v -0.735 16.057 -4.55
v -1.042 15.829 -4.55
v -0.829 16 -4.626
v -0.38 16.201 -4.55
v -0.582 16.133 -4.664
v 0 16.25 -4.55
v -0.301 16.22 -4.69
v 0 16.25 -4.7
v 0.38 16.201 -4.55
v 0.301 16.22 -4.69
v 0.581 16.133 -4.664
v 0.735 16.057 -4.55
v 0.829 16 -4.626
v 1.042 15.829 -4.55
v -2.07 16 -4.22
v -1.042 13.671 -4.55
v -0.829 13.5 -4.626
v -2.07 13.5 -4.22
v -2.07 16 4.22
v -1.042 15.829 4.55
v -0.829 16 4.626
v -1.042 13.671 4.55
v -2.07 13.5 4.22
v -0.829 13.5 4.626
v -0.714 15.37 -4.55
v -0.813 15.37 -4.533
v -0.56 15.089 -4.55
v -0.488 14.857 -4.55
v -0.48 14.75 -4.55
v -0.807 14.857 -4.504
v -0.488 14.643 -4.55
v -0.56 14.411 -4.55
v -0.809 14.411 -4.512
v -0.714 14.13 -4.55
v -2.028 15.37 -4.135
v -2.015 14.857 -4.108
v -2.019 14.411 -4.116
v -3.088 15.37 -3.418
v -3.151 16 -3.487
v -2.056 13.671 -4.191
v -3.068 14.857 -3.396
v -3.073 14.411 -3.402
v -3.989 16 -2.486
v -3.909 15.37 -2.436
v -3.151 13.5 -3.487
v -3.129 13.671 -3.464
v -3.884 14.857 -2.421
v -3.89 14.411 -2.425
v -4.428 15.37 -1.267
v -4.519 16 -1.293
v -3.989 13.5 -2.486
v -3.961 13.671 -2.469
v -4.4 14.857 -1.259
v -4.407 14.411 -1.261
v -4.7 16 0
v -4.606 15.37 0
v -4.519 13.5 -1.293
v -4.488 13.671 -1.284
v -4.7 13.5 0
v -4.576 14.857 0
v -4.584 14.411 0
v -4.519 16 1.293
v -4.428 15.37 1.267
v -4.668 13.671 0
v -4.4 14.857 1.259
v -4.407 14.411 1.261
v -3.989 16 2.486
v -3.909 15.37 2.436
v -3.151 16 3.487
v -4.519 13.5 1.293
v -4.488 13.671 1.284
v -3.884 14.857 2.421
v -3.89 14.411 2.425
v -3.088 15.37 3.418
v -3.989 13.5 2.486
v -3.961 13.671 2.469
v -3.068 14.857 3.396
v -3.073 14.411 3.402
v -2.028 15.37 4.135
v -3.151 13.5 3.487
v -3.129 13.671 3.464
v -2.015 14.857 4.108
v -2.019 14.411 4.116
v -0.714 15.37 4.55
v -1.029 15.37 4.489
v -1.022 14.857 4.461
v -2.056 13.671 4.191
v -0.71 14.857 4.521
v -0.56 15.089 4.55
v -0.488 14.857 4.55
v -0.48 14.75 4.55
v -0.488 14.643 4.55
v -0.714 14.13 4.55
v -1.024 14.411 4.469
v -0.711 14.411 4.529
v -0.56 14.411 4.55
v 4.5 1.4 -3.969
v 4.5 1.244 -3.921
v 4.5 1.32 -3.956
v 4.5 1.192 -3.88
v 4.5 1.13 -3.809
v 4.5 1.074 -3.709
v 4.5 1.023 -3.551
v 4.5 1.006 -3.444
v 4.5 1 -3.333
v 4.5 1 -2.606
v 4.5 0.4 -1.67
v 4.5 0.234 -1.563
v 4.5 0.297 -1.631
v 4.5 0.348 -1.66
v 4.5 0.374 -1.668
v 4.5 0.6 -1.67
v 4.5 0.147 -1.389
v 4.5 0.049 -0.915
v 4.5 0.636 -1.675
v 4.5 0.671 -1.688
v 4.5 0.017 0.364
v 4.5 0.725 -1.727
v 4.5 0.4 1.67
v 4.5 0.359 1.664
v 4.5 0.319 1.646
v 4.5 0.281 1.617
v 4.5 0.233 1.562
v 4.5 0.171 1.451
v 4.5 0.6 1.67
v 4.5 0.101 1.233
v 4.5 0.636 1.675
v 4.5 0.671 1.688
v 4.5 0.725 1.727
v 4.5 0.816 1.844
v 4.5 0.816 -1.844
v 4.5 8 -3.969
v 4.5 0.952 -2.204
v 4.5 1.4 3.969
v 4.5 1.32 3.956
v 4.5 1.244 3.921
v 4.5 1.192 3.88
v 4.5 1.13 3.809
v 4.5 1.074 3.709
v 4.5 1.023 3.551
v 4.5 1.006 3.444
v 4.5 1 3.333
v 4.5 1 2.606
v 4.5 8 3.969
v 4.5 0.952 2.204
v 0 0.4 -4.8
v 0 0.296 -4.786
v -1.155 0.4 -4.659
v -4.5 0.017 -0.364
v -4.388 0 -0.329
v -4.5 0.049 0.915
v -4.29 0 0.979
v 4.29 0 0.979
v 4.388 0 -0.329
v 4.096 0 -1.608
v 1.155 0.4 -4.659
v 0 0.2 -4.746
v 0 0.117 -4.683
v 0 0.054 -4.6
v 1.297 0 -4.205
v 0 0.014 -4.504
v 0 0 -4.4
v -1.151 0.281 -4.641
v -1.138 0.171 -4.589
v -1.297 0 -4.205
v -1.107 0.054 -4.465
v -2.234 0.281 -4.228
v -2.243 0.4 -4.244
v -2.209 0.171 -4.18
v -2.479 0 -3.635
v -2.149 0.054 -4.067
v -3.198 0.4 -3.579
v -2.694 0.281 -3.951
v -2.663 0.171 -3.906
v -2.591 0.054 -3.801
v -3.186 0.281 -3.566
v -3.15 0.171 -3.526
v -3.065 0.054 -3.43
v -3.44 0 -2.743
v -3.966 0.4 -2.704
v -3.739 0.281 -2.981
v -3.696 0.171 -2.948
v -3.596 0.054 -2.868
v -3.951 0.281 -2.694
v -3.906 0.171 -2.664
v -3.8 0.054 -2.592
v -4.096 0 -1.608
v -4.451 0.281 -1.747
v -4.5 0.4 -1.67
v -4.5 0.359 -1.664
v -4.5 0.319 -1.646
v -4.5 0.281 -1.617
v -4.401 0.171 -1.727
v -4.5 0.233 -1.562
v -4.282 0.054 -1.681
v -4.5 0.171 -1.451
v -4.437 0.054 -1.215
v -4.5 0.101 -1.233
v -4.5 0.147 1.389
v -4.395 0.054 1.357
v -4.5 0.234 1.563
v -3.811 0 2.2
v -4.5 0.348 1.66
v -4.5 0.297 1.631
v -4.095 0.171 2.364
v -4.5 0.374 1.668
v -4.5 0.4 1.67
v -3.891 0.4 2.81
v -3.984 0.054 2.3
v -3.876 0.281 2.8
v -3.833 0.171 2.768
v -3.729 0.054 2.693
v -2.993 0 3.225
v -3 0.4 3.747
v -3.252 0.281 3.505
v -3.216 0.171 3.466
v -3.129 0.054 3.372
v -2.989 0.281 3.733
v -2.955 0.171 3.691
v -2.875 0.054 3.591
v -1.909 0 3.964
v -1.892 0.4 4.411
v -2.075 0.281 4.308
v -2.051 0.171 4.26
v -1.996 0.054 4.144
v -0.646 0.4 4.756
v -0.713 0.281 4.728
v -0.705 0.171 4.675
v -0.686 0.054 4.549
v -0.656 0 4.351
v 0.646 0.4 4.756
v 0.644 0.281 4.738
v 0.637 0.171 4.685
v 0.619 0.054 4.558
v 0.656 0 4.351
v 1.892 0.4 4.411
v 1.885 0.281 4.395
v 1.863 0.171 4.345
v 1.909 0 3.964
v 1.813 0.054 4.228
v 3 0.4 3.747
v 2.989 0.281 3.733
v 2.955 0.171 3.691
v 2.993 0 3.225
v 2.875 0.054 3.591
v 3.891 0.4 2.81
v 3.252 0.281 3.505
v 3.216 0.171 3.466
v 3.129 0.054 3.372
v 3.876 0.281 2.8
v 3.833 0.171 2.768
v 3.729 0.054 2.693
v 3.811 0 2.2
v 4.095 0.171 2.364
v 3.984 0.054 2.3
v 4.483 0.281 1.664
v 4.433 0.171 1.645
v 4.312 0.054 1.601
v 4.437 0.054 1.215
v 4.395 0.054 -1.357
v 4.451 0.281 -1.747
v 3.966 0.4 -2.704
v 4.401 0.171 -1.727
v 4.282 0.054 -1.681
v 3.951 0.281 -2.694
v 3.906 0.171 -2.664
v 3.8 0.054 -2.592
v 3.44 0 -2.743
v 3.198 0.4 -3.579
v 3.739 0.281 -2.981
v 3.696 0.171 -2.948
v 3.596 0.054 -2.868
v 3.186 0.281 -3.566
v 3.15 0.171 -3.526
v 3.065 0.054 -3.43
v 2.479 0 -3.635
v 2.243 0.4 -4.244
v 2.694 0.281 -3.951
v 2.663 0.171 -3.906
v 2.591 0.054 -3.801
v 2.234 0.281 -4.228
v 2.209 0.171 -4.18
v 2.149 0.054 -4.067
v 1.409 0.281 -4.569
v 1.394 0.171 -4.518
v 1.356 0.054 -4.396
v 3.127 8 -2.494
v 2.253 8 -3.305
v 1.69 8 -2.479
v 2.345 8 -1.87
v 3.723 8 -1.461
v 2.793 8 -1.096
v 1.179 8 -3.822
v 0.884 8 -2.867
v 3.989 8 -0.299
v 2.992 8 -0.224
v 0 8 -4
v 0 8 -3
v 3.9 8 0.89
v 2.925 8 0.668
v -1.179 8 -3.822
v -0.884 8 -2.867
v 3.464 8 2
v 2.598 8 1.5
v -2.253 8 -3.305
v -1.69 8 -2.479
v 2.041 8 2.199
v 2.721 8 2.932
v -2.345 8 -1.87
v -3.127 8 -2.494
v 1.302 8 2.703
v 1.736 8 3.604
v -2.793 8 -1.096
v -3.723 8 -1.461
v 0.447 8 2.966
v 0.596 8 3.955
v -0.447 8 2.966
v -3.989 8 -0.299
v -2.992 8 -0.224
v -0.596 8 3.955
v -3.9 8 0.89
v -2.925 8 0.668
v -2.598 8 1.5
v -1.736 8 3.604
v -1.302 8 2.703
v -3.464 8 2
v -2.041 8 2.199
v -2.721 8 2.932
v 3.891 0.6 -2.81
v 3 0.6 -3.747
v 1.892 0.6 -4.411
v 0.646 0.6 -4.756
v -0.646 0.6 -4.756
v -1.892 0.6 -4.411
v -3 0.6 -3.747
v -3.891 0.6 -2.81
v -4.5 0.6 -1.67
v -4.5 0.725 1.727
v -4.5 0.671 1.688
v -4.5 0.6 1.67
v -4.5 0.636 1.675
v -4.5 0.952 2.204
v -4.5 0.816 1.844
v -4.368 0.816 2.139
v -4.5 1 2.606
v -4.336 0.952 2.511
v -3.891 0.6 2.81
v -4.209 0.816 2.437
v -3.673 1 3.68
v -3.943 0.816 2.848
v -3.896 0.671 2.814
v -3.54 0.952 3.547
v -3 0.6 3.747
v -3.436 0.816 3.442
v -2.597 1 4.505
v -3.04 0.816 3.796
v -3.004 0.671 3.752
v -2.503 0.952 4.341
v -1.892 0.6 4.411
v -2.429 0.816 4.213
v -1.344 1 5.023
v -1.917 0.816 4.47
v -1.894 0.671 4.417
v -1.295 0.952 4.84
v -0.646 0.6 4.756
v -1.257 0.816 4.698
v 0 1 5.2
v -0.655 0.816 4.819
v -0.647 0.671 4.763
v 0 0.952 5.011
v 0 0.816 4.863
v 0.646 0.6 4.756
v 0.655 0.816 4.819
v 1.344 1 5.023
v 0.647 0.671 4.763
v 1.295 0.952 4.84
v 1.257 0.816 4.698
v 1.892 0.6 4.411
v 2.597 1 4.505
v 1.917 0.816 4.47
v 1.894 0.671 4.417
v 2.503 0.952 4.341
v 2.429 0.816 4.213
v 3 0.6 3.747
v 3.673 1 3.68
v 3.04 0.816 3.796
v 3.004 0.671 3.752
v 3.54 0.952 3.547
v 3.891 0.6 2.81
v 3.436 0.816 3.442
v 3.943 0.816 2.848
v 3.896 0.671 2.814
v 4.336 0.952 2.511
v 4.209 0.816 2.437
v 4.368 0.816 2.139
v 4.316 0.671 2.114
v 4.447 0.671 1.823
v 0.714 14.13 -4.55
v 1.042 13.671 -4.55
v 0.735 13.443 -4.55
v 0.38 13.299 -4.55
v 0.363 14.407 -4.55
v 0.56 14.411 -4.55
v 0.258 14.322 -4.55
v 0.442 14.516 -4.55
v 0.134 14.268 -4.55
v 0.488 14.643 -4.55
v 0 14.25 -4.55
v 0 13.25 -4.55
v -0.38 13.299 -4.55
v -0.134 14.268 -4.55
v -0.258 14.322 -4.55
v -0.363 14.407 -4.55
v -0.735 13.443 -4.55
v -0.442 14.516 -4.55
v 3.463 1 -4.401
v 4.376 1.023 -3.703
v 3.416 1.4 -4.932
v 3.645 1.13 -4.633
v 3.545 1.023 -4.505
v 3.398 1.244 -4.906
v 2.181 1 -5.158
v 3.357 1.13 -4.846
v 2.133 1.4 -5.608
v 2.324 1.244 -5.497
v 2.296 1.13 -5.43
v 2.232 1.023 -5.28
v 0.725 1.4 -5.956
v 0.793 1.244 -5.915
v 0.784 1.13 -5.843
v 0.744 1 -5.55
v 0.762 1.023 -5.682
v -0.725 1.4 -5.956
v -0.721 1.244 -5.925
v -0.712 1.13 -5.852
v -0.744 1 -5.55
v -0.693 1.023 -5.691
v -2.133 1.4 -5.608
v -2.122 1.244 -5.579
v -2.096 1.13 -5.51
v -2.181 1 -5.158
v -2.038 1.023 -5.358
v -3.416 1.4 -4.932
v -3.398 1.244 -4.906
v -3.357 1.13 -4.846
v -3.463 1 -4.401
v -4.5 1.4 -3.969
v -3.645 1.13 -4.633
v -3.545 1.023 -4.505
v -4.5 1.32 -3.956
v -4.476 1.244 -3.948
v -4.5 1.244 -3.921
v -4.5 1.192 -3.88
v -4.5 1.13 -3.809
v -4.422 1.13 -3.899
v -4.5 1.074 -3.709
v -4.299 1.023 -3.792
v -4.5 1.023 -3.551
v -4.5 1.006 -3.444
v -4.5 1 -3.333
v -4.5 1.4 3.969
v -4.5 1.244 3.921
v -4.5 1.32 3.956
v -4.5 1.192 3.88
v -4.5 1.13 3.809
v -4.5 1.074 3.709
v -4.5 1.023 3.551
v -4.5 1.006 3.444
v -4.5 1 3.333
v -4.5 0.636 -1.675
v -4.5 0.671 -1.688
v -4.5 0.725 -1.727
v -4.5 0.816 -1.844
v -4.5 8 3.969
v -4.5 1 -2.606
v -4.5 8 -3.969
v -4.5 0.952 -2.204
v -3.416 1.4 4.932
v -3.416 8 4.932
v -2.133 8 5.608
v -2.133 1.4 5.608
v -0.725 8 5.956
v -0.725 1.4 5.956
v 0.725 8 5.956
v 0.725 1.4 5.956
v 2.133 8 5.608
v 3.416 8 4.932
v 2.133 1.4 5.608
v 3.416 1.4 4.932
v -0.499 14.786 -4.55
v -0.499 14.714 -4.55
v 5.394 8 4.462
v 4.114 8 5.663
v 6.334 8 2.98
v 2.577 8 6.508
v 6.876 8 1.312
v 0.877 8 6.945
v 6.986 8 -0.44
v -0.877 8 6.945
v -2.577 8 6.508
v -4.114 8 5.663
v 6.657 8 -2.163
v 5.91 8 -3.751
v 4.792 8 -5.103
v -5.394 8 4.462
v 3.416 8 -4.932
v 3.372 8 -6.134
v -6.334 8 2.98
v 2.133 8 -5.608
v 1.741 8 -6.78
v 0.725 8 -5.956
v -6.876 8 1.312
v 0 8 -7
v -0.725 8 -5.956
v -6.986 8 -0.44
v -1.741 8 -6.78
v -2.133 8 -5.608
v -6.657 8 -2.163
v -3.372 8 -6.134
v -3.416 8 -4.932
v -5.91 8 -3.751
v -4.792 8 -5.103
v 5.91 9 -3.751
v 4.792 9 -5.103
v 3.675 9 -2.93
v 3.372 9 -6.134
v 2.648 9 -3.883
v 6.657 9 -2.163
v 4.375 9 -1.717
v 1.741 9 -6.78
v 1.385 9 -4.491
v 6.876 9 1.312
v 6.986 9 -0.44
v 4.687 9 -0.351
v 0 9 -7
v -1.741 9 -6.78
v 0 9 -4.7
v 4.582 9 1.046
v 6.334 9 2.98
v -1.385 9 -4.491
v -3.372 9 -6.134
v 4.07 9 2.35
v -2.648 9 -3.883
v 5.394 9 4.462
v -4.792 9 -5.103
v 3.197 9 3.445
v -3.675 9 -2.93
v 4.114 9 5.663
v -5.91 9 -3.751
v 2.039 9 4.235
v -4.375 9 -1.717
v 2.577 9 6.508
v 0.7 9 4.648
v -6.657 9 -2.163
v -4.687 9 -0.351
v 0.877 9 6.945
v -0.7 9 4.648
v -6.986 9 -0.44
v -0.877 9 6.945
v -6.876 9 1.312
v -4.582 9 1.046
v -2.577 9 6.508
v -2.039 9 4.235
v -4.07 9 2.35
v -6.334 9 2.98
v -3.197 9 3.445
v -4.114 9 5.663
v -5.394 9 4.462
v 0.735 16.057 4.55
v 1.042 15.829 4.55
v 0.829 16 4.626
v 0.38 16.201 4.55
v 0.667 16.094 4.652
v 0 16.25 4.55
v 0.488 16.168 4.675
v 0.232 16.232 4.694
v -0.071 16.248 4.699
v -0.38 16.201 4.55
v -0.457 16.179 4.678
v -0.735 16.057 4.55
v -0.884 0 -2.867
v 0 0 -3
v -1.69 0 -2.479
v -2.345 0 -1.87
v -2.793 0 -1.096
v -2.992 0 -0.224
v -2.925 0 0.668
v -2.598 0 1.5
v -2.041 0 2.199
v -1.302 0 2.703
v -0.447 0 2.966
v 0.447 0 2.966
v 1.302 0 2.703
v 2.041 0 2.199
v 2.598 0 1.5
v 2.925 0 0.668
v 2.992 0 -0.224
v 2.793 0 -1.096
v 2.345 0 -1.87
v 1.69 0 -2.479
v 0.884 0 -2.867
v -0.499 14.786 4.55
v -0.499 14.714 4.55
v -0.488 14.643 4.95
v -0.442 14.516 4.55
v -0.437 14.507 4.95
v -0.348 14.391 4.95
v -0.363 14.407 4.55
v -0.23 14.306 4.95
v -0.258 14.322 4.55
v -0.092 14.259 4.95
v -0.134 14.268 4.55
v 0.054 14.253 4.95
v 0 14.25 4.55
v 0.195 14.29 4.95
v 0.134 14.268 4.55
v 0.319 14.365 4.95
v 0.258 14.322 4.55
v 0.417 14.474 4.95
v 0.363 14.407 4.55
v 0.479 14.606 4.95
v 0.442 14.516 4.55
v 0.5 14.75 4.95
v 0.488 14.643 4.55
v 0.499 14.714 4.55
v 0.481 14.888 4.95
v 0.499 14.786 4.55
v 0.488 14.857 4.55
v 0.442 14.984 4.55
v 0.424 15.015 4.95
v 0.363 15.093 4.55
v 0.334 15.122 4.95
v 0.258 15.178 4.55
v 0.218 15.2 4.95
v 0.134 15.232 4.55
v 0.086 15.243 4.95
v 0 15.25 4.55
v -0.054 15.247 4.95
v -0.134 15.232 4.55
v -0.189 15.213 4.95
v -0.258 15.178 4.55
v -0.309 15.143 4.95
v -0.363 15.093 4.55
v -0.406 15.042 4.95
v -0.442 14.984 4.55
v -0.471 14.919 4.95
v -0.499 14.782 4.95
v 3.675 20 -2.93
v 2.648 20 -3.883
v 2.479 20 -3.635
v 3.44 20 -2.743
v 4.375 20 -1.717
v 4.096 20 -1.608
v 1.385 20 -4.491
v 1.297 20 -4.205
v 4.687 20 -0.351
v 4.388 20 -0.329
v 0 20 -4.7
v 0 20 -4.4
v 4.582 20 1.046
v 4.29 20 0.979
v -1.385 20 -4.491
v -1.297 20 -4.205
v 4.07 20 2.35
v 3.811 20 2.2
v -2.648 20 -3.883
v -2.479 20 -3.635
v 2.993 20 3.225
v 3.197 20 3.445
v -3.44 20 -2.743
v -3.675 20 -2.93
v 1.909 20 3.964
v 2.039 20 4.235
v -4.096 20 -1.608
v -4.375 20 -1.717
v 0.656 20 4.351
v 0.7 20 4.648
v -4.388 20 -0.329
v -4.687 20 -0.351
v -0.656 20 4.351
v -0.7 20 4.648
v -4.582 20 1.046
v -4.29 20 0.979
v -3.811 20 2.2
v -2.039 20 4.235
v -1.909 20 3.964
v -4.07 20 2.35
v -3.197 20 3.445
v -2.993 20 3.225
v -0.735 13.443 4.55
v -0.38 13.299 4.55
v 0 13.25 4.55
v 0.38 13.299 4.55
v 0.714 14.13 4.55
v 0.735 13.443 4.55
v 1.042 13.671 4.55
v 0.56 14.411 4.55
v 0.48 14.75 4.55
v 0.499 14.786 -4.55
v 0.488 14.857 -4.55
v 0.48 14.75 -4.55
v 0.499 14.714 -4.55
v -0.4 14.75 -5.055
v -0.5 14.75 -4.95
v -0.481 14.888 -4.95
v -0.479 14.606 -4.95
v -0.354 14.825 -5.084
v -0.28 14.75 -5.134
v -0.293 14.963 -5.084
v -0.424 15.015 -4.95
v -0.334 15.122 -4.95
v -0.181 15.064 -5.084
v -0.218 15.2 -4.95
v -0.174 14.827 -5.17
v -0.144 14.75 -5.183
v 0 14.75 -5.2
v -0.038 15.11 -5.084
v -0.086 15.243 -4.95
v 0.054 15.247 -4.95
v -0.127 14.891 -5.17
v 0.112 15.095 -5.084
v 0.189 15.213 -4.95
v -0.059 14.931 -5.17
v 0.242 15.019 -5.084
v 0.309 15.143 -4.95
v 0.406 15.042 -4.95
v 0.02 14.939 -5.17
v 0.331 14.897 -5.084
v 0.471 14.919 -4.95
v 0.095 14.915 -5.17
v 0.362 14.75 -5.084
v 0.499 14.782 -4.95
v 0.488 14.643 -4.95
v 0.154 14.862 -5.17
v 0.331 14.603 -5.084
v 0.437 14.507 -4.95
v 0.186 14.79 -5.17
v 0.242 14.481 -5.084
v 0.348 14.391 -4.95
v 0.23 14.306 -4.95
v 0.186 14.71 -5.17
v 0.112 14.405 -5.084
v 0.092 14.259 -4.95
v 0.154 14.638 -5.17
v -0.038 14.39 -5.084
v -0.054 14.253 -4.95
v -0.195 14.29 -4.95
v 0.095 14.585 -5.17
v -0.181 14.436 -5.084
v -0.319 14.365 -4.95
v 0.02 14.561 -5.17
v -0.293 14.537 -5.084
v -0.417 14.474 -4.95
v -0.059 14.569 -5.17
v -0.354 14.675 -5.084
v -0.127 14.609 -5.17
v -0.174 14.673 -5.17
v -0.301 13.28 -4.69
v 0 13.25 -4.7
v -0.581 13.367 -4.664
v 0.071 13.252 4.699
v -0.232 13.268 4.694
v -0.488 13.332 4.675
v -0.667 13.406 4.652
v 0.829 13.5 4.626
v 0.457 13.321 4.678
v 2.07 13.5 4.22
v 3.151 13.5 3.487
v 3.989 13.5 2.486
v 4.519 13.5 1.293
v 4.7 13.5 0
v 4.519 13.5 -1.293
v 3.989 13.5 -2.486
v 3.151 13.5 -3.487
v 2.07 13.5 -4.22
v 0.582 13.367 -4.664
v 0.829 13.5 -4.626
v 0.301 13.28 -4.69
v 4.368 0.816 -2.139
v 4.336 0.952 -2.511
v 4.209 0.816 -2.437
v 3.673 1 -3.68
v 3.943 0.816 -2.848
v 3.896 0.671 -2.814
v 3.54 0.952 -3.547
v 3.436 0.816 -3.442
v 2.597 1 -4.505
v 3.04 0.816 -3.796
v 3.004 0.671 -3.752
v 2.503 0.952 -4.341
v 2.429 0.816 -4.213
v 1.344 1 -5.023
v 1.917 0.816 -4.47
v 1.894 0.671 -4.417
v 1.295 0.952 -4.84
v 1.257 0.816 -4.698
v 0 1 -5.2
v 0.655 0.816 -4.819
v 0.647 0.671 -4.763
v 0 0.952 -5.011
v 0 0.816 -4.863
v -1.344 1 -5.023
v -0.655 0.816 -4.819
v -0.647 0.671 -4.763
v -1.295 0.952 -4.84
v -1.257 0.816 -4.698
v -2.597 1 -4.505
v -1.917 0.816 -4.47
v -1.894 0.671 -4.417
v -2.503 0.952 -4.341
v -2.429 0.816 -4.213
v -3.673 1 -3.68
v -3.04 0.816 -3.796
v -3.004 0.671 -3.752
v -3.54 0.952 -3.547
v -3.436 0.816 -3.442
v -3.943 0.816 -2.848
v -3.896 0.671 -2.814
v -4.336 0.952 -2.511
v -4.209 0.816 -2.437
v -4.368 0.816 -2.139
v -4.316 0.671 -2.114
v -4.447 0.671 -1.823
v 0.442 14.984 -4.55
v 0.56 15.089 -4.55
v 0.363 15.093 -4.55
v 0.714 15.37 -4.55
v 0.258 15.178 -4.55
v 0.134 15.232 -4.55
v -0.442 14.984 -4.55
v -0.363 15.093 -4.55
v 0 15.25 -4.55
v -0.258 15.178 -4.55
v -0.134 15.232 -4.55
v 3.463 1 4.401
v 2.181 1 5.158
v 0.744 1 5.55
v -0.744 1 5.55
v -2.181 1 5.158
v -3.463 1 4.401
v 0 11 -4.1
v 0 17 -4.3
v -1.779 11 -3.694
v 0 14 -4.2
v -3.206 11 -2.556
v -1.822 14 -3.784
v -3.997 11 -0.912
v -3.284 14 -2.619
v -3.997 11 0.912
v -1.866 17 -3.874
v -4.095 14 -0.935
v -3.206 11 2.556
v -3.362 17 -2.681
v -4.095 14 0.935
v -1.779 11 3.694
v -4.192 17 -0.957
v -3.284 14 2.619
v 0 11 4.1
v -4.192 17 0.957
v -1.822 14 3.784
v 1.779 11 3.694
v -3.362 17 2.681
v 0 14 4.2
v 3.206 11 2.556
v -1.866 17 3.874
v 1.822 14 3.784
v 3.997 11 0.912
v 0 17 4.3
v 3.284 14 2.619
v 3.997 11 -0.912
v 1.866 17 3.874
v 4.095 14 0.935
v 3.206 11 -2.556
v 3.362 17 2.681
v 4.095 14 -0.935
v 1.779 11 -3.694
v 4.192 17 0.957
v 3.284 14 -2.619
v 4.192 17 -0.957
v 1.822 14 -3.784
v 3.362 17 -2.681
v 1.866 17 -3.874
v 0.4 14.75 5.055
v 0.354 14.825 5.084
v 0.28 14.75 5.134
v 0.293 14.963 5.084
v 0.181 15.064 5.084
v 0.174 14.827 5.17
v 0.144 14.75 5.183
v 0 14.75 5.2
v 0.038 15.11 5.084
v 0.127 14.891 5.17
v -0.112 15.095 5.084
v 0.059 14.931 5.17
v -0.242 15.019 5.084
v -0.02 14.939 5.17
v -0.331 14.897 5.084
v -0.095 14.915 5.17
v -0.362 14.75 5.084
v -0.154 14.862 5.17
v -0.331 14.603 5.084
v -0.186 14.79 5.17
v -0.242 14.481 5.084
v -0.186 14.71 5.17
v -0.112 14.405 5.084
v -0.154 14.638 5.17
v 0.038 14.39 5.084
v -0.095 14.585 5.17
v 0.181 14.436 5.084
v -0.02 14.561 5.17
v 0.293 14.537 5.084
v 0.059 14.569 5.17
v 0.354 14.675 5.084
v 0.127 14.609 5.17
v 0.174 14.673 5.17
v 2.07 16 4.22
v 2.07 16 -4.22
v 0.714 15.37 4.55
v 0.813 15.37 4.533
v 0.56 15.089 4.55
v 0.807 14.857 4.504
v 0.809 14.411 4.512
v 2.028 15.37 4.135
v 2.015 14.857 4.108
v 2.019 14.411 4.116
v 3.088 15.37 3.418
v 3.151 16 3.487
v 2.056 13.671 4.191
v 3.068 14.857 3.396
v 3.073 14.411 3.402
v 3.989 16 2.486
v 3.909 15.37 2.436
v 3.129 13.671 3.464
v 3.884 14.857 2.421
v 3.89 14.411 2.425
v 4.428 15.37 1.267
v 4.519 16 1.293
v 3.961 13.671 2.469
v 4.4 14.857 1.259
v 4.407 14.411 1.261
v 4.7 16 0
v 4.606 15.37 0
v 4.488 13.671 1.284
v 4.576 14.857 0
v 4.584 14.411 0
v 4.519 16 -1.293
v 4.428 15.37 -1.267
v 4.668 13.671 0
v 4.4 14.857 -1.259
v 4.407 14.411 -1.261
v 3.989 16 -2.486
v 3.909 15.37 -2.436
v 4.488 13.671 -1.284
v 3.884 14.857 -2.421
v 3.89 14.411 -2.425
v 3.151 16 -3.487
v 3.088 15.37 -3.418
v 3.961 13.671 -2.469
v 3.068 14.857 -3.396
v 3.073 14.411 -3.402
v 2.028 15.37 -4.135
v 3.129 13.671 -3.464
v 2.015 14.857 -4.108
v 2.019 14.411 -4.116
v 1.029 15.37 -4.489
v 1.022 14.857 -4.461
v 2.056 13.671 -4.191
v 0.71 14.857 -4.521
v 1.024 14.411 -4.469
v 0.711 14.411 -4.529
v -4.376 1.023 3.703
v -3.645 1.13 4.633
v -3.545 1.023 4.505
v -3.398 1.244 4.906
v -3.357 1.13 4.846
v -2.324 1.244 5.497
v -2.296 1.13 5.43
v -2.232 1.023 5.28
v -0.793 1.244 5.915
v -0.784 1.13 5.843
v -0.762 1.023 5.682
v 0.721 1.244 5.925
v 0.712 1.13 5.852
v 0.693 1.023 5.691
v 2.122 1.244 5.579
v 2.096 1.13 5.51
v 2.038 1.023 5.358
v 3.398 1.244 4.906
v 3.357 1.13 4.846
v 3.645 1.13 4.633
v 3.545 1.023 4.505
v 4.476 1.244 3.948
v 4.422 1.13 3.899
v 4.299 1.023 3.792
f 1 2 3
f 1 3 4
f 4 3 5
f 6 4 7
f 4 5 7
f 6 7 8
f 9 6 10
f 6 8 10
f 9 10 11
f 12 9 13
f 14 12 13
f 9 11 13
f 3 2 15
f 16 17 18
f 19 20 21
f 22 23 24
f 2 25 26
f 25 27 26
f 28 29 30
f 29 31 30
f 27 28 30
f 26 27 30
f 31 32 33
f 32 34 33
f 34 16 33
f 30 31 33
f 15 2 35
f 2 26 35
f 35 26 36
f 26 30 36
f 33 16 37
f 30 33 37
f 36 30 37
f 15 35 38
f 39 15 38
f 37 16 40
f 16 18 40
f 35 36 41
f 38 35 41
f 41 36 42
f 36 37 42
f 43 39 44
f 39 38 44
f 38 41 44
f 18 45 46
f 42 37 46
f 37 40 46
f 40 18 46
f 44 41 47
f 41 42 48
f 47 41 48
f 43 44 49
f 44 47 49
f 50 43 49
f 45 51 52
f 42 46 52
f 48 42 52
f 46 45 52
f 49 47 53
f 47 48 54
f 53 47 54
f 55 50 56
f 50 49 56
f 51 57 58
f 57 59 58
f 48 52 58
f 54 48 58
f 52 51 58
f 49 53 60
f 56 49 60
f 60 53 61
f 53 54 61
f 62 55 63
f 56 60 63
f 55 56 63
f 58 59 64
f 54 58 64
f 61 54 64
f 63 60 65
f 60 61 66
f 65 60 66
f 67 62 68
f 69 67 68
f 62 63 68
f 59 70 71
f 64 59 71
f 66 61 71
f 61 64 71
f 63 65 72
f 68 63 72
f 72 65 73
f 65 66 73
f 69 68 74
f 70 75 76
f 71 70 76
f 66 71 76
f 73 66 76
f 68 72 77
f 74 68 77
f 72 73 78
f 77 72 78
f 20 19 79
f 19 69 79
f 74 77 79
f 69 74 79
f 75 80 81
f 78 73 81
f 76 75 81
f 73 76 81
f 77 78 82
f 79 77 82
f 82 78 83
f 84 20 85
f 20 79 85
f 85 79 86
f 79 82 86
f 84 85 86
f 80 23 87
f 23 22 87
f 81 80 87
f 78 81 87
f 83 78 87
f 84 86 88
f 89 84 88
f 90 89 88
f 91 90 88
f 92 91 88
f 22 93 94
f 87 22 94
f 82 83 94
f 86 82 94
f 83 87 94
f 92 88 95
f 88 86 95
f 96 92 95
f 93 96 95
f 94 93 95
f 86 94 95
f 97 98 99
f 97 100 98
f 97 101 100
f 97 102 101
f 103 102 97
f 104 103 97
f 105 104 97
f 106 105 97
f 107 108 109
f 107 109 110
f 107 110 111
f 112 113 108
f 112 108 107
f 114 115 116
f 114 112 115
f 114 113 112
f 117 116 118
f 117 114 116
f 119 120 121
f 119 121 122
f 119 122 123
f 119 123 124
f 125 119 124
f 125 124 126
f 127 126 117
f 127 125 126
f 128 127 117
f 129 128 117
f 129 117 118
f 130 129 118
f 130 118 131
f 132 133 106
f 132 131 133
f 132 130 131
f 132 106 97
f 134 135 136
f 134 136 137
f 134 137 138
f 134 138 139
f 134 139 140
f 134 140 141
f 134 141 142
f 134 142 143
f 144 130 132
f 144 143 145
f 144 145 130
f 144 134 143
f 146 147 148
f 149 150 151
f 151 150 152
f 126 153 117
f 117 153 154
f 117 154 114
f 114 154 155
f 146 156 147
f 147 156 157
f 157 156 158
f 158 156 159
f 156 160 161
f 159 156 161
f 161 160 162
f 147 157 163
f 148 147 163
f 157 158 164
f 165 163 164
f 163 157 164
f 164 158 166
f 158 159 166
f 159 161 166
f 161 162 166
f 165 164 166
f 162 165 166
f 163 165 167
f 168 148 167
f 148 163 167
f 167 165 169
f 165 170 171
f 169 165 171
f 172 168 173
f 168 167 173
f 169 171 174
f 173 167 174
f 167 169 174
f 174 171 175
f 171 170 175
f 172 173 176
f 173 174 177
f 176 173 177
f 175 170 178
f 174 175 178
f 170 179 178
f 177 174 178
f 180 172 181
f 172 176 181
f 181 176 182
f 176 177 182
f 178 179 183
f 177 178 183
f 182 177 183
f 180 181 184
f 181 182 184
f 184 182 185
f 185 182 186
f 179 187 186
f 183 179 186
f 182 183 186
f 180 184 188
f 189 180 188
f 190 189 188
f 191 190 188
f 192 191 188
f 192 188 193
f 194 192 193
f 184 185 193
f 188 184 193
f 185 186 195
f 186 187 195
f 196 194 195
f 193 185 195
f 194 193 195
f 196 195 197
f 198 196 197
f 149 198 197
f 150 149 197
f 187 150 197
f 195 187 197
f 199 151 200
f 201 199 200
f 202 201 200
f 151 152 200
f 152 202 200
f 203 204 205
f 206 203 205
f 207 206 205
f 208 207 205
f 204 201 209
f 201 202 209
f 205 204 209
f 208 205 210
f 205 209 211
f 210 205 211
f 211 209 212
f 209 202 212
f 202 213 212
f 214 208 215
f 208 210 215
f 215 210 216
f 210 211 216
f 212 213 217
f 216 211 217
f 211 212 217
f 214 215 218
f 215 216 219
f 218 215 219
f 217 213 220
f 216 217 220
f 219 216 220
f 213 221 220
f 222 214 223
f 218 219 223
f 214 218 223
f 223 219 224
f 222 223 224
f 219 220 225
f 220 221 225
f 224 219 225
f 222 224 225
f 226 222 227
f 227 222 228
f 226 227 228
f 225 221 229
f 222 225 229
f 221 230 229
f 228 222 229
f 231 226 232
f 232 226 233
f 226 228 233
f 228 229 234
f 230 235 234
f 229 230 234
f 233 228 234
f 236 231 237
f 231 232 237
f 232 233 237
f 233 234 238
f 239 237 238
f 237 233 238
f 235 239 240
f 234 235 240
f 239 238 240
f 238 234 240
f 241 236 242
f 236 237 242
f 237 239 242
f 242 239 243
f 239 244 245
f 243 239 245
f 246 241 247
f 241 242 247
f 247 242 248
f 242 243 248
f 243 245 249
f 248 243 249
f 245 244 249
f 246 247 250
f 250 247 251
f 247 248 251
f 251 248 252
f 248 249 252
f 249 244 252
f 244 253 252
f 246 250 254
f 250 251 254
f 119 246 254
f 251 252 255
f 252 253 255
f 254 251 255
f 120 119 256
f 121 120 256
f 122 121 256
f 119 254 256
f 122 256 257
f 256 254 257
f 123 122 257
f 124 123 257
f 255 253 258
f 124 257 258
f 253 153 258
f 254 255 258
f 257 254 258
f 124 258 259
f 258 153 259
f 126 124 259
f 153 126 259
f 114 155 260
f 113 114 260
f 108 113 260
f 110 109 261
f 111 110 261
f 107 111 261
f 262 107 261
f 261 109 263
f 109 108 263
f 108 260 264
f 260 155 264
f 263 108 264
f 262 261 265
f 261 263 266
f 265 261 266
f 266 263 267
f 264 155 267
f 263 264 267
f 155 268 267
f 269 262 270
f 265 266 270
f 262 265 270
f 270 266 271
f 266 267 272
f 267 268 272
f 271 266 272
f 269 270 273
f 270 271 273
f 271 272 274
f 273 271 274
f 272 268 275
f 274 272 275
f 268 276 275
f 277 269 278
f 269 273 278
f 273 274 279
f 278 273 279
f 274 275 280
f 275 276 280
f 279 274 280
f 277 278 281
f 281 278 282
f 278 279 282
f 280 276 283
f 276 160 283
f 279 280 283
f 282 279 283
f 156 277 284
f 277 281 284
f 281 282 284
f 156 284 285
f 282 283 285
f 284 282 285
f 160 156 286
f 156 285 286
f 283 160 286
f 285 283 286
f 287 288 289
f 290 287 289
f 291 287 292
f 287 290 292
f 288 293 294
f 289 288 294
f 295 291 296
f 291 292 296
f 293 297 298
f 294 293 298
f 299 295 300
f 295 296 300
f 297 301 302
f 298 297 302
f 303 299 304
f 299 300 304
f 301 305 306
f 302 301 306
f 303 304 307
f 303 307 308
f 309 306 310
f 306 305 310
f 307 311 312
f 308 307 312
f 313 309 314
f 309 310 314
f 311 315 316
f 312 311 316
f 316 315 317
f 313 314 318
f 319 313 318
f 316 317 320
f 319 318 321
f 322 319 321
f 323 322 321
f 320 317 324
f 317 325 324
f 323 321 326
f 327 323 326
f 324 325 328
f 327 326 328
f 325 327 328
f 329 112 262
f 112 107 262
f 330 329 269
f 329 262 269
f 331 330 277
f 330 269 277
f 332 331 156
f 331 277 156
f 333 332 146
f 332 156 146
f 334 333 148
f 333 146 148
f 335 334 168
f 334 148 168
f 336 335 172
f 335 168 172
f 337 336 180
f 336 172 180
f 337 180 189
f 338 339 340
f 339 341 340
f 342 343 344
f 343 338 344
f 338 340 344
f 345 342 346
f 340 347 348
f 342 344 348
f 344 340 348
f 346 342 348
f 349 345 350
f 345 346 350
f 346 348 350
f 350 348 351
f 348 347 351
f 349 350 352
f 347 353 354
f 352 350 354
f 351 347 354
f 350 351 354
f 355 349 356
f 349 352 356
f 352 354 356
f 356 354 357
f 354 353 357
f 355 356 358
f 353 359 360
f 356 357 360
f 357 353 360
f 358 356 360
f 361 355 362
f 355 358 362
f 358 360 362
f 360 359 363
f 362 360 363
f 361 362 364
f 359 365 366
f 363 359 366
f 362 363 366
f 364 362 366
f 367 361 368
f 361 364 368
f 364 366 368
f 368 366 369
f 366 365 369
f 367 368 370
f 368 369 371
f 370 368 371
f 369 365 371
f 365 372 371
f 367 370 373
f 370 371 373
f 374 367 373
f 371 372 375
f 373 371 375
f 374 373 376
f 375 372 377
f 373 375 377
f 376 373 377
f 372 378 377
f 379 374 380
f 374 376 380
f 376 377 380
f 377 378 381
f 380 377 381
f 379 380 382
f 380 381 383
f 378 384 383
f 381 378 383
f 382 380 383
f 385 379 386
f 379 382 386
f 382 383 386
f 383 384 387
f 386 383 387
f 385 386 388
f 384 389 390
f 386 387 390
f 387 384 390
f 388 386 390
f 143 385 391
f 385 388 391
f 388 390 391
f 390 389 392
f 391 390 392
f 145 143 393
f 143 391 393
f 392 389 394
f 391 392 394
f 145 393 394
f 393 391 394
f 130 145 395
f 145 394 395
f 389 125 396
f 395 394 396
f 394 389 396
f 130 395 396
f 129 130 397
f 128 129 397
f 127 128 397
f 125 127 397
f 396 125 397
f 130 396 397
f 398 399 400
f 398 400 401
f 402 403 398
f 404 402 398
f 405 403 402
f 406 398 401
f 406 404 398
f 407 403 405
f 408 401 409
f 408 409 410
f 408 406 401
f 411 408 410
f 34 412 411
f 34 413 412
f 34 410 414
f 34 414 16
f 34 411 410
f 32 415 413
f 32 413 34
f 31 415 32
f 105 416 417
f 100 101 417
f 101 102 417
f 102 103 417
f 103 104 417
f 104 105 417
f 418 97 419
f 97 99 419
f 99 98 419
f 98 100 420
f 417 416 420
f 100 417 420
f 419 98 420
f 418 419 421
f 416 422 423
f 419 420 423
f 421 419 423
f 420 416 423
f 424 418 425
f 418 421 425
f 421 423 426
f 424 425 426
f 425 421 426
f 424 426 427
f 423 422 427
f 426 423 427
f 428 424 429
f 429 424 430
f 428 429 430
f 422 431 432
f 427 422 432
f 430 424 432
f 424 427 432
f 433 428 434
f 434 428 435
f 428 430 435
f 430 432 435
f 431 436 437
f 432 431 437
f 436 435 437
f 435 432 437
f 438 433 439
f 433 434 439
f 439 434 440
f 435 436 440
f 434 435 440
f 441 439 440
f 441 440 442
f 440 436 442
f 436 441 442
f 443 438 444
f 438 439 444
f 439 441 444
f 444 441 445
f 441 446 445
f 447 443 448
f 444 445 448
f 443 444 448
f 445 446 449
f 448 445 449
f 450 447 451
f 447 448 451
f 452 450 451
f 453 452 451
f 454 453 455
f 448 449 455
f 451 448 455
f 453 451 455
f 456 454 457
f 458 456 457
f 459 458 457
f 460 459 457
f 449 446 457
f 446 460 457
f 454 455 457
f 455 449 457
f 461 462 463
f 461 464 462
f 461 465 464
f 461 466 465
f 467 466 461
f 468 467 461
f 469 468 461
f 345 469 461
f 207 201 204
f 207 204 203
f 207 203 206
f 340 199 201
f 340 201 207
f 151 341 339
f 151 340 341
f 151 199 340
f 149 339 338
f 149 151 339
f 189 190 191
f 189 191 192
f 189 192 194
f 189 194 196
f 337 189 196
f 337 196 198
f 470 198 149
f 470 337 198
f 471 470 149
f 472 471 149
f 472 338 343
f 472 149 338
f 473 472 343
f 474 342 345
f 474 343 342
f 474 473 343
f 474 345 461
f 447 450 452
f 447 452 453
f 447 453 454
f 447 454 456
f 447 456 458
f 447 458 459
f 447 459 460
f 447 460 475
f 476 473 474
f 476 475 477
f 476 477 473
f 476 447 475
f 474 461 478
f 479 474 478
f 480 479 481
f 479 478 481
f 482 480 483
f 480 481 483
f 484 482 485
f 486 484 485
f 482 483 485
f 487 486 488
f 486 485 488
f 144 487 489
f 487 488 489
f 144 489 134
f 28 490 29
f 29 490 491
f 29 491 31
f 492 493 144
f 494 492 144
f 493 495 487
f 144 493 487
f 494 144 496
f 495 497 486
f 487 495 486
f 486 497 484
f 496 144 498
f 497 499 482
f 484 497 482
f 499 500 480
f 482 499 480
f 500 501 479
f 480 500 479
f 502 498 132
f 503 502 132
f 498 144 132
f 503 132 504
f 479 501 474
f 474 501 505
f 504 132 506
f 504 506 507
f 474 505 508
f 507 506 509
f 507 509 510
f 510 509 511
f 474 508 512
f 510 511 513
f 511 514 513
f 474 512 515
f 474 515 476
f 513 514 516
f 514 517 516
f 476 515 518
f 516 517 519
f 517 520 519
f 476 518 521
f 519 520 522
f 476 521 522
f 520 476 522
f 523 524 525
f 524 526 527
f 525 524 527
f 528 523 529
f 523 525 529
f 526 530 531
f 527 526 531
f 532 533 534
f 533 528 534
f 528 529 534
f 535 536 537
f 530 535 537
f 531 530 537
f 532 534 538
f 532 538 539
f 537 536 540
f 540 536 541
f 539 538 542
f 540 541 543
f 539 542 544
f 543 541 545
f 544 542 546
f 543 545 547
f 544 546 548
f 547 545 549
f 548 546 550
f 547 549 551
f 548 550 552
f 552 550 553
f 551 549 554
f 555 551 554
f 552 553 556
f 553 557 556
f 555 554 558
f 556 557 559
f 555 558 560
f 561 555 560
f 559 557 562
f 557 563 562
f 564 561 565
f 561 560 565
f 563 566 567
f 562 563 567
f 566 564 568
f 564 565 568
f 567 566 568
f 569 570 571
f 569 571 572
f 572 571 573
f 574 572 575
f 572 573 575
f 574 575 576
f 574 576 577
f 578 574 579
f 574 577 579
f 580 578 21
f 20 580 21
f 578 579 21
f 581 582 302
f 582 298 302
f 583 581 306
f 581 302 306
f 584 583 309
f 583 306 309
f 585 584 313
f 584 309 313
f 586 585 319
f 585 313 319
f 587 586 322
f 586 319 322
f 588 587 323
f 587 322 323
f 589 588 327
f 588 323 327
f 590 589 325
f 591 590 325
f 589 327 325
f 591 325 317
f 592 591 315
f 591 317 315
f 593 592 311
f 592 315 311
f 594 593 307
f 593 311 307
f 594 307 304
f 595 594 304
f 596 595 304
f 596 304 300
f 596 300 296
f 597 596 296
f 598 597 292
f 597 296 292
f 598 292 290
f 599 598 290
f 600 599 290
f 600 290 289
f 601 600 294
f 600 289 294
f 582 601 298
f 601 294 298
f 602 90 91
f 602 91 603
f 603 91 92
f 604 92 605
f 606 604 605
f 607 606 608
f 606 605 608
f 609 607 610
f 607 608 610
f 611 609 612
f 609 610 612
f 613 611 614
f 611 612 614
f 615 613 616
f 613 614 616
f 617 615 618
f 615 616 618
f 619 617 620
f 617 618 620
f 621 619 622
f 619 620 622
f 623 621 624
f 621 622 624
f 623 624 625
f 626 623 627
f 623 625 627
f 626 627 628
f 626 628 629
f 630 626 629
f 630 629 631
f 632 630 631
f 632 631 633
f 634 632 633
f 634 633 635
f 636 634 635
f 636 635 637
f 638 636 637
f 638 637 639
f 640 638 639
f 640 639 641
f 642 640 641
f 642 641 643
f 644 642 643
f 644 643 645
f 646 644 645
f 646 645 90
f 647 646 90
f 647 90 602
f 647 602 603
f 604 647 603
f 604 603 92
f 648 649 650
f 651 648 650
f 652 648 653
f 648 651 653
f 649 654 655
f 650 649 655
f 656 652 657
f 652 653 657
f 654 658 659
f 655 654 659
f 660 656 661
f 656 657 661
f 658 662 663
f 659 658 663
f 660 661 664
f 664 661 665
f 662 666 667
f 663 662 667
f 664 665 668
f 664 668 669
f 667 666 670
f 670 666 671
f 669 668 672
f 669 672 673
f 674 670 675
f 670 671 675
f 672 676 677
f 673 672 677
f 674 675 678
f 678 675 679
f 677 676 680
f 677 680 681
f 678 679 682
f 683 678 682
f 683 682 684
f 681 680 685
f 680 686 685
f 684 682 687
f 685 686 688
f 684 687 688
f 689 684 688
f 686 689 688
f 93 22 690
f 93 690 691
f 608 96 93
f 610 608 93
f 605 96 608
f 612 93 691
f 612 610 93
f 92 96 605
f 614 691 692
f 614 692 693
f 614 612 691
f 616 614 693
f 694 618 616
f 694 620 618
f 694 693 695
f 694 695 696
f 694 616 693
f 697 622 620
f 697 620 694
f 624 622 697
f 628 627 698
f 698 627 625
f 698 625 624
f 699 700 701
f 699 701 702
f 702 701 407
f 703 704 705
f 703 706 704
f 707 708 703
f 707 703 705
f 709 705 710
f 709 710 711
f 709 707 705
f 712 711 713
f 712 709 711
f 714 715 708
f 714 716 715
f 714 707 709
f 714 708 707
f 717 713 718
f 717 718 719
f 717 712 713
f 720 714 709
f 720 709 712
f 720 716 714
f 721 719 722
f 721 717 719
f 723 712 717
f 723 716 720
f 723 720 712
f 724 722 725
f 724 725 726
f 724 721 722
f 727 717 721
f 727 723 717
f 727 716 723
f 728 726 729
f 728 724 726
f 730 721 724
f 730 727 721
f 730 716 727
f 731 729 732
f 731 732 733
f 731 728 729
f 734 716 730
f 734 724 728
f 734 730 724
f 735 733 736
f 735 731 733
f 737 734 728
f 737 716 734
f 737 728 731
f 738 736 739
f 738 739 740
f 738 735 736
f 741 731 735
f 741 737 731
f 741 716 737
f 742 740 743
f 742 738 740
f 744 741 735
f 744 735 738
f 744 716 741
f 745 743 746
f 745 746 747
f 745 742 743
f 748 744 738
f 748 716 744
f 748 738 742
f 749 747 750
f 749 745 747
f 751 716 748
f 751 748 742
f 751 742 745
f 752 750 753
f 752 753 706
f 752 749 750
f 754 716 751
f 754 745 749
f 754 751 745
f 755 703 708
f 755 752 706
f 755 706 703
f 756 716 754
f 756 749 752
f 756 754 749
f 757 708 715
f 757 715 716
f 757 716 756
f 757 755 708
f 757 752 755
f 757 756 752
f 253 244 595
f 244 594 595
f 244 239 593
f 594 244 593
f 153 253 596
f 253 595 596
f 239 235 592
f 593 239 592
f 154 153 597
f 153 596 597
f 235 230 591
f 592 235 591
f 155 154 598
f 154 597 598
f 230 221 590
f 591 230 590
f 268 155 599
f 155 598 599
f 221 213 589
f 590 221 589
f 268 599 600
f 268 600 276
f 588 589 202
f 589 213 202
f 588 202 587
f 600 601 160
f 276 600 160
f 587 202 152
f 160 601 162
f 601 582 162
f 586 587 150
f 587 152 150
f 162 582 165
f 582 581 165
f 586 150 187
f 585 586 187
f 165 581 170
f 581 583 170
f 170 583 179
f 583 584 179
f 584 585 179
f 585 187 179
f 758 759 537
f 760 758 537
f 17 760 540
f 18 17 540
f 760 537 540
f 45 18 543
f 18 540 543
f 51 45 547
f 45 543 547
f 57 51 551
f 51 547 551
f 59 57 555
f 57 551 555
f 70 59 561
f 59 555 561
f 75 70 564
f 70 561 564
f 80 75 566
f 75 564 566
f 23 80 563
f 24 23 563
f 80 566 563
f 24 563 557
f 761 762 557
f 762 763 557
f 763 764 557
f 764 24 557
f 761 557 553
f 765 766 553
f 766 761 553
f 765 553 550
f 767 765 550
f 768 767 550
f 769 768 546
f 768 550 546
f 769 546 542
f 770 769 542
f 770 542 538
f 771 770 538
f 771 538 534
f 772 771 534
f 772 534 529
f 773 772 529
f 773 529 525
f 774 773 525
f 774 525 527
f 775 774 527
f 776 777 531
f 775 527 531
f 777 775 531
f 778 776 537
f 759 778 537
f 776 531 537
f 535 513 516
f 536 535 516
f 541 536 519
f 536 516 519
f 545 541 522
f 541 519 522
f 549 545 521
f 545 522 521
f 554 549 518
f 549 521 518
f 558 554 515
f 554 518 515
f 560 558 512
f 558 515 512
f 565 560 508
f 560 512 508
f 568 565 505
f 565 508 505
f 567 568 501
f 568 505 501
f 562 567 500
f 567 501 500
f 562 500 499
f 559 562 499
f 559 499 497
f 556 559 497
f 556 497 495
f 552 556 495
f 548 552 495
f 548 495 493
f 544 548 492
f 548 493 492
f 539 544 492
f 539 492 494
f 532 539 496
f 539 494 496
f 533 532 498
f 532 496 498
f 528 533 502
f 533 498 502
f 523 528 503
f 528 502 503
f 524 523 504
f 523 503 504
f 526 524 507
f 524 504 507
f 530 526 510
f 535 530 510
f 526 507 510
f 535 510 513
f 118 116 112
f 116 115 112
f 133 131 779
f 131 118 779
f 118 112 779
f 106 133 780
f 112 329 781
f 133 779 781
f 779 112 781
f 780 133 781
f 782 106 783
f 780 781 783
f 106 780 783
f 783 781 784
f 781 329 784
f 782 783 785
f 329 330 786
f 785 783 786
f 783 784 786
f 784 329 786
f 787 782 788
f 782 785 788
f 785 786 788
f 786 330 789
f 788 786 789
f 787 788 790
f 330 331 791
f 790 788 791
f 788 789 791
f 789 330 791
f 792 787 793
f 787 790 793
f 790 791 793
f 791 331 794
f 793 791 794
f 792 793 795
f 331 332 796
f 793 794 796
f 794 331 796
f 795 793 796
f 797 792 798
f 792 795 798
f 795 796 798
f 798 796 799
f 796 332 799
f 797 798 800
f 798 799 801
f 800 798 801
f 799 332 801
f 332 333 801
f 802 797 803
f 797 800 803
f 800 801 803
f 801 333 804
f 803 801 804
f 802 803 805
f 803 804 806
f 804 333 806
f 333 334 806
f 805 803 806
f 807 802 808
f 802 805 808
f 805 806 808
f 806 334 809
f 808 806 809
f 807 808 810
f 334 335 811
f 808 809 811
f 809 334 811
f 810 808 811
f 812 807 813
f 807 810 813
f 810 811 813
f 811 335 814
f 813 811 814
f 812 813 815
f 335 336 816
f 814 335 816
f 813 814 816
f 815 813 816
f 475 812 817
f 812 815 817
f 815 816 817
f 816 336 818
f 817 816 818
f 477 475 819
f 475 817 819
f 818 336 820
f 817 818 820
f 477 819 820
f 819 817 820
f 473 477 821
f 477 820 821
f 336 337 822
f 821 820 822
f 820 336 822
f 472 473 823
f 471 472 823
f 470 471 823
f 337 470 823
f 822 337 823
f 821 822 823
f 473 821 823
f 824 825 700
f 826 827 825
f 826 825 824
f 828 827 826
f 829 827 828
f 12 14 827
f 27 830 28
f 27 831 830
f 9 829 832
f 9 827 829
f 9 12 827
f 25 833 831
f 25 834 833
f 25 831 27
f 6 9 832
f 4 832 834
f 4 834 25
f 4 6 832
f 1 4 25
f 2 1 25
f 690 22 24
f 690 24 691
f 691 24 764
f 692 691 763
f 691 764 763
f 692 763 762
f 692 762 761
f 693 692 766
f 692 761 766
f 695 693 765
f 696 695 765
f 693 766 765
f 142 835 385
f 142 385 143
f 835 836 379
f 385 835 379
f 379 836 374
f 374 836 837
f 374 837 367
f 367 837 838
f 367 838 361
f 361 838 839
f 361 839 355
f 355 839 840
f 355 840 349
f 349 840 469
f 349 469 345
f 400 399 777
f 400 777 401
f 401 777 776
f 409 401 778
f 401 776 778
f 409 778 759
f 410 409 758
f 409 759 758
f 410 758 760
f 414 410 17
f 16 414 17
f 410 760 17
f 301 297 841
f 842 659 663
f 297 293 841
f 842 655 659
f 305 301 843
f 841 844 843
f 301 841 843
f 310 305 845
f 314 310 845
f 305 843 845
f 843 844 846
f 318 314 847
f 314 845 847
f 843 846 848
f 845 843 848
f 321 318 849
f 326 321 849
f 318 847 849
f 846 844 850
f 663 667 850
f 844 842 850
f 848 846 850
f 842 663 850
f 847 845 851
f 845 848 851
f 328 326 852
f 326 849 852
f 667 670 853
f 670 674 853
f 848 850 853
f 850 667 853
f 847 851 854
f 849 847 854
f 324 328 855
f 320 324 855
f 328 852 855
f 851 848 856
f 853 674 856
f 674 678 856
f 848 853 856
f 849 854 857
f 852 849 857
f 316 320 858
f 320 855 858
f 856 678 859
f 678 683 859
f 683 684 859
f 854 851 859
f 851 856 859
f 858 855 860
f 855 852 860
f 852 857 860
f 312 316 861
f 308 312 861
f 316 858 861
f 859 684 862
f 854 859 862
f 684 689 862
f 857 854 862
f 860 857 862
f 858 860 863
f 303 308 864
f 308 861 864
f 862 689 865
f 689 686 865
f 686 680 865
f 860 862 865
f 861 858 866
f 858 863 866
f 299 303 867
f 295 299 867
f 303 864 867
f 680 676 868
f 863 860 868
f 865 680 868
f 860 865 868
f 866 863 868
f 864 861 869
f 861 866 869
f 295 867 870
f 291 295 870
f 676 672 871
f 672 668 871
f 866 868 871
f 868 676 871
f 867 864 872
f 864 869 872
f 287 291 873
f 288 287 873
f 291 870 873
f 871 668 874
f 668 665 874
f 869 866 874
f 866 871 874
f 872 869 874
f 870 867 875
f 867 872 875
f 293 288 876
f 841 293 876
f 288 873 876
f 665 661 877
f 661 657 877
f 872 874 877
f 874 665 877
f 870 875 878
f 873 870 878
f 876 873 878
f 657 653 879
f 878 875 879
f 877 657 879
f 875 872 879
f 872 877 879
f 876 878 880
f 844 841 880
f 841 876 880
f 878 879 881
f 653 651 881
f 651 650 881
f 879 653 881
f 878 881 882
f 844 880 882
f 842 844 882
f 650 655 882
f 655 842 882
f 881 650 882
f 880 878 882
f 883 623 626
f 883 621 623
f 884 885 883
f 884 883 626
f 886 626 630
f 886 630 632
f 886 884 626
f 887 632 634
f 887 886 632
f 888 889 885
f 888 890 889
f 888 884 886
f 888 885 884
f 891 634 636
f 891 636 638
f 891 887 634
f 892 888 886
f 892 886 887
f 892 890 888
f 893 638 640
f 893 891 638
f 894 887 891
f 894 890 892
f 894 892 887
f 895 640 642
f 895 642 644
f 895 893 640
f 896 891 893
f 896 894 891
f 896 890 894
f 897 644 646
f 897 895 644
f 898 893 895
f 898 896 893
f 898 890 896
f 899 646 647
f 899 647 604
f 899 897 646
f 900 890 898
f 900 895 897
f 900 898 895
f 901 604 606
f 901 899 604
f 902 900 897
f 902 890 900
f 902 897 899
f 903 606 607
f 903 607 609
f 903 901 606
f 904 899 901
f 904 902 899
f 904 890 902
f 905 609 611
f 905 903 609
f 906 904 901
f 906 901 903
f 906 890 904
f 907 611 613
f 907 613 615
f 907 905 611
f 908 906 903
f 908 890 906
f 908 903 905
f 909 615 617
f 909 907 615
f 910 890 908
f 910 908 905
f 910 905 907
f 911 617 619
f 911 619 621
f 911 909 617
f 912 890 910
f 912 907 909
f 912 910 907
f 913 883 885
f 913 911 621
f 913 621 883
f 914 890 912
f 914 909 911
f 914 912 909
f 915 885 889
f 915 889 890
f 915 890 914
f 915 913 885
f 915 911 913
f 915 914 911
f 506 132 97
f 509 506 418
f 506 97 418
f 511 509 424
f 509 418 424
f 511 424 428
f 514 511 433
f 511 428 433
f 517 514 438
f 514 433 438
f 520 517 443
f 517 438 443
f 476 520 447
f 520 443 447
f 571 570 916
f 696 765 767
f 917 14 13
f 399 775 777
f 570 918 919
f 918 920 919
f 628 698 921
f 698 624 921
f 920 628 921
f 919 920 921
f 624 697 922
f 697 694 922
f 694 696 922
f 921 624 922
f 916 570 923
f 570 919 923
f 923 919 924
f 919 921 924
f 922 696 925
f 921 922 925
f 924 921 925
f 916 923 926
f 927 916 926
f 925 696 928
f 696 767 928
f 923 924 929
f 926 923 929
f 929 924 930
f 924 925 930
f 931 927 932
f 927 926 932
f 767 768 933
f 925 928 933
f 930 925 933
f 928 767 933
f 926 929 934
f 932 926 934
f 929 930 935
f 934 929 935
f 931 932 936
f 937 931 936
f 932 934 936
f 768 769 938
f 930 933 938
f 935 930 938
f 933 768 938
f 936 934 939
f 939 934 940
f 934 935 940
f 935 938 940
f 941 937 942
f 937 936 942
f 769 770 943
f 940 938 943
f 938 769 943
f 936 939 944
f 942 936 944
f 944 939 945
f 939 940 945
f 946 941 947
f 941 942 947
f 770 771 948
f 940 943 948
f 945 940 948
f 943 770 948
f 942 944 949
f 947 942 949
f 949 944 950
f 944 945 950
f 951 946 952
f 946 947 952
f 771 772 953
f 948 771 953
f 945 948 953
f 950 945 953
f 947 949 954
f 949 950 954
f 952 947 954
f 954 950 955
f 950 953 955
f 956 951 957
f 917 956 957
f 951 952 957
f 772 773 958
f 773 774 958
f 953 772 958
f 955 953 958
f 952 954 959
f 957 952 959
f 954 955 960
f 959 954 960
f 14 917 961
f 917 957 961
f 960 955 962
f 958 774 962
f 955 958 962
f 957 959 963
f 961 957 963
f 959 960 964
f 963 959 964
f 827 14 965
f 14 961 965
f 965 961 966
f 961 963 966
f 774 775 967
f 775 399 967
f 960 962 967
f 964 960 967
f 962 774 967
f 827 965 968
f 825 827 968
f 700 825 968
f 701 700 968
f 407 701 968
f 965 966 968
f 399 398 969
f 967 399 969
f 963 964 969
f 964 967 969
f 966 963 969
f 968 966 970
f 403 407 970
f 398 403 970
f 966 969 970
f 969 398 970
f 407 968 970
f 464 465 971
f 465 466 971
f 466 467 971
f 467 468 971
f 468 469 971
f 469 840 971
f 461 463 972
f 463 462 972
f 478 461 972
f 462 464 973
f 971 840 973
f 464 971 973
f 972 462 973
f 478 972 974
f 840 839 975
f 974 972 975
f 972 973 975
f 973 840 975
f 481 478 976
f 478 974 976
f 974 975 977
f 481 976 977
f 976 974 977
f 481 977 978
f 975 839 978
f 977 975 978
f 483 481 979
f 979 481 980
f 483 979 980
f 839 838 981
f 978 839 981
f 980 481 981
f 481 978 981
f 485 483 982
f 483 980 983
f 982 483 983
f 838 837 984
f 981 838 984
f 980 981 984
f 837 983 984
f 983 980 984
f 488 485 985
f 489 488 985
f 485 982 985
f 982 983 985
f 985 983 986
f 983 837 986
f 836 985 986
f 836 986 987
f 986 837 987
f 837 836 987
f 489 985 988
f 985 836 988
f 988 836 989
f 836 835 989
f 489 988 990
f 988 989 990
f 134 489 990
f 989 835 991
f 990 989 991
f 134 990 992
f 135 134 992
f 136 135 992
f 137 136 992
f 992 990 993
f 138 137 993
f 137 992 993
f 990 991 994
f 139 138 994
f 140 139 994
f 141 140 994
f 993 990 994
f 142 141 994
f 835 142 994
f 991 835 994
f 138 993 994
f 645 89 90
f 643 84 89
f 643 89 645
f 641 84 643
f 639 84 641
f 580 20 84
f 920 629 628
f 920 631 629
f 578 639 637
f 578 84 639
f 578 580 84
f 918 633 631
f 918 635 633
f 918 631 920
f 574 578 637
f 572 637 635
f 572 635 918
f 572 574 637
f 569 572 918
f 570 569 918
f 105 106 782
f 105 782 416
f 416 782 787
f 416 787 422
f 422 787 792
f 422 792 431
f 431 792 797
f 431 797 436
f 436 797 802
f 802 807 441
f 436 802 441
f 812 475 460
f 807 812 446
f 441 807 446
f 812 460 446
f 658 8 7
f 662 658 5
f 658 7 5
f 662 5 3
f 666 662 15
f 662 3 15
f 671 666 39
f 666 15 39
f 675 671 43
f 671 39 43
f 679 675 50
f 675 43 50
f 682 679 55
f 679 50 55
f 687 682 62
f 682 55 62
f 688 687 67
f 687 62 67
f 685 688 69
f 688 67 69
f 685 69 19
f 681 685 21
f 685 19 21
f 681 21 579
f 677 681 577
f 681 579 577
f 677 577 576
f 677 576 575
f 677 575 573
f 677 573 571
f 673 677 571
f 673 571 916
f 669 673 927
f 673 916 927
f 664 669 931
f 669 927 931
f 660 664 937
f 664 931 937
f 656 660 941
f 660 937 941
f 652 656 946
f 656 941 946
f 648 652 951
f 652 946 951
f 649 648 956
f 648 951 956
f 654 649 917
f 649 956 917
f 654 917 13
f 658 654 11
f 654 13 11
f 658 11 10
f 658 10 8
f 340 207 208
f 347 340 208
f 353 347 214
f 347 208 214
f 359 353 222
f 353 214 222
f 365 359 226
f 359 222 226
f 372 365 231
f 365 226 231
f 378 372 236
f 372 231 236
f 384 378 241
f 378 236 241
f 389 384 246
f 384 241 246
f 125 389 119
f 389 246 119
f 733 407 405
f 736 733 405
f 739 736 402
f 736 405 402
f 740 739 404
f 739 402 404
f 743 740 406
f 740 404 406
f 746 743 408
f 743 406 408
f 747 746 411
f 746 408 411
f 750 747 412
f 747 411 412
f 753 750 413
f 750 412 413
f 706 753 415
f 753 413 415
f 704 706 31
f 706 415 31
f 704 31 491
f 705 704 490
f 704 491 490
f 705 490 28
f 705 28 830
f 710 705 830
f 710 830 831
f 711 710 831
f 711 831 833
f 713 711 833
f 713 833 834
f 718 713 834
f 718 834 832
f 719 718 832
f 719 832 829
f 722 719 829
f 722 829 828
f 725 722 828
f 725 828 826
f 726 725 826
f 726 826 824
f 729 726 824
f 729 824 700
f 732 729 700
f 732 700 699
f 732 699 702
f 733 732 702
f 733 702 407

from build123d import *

# Parameters (mm, degrees)
SKETCH_2_W                            = 2.5
SKETCH_2_H                            = 8
CUT_EXTRUDE_1_DEPTH                   = 10
SKETCH_5_R                            = 1.5
CUT_EXTRUDE_4_DEPTH                   = 0.15
SKETCH_7_R                            = 0.5
EXTRUDE_1_DEPTH                       = 0.4
DOME_1_FACE_RADIUS                    = 0.5
DOME_1_HEIGHT                         = 0.25
PATTERN_CIRCULAR_1_COUNT              = 2
PATTERN_CIRCULAR_1_COPY_1_FACE_RADIUS = 0.5
PATTERN_CIRCULAR_1_COPY_1_HEIGHT      = 0.25


with BuildPart() as part:
    # Эскиз1 → Повернуть1 (revolve)
    with BuildSketch(Plane(origin=(0, 0, 0), x_dir=(0, 0, -1), z_dir=(1, 0, 0))):
        with BuildLine():
            Line((4.7, 20), (4.7, 16))
            ThreePointArc((4.7, 16), (4.57524704, 14.75), (4.7, 13.5))
            Line((4.7, 13.5), (4.7, 9))
            Line((4.7, 9), (7, 9))
            Line((7, 9), (7, 8))
            Line((7, 8), (6, 8))
            Line((6, 8), (6, 1.4))
            ThreePointArc((6, 1.4), (5.882842712, 1.117157288), (5.6, 1))
            Line((5.6, 1), (5.2, 1))
            ThreePointArc((5.2, 1), (4.917157288, 0.882842712), (4.8, 0.6))
            Line((4.8, 0.6), (4.8, 0.4))
            ThreePointArc((4.8, 0.4), (4.682842712, 0.117157288), (4.4, 0))
            Line((4.4, 0), (3, 0))
            Line((3, 0), (3, 8))
            Line((3, 8), (4, 8))
            Line((4, 8), (4.4, 20))
            Line((4.4, 20), (4.7, 20))
        make_face()
    revolve(axis=Axis((0, 0, 0), (0, 1, 0)))

    # Эскиз2 → Вырез-Вытянуть1 (cut, symmetric)
    with BuildSketch(Plane.XY):
        with Locations((-5.75, 4)):
            Rectangle(SKETCH_2_W, SKETCH_2_H)
        with Locations((5.75, 4)):
            Rectangle(SKETCH_2_W, SKETCH_2_H)
    extrude(amount=CUT_EXTRUDE_1_DEPTH, both=True, mode=Mode.SUBTRACT)

    # Эскиз5 → Вырез-Вытянуть4 (cut)
    with BuildSketch(Plane.XY.offset(4.7)):
        with Locations((0, 14.75)):
            Circle(SKETCH_5_R)
    cut_extrude_4 = extrude(amount=-CUT_EXTRUDE_4_DEPTH, mode=Mode.SUBTRACT)

    # Эскиз7 → Бобышка-Вытянуть1 (add)
    with BuildSketch(Plane.XY.offset(4.55)):
        with Locations(Location((0, 14.75, 0), (0, 0, 192.319298658))):
            Circle(SKETCH_7_R)
    extrude_1 = extrude(amount=EXTRUDE_1_DEPTH)

    # Купол1: a dome of height H over a round flat face of radius A is a cap of a sphere of radius (A * A + H * H) / (2 * H)
    dome_1_r = (DOME_1_FACE_RADIUS * DOME_1_FACE_RADIUS + DOME_1_HEIGHT * DOME_1_HEIGHT) / (2 * DOME_1_HEIGHT)
    dome_1_base = Plane((0, 14.75, 4.95), z_dir=(0, 0, 1))
    with Locations(dome_1_base.offset(DOME_1_HEIGHT - dome_1_r)):
        dome_1_ball = Sphere(dome_1_r, mode=Mode.PRIVATE)
    add(split(dome_1_ball, bisect_by=dome_1_base, keep=Keep.TOP, mode=Mode.PRIVATE))

    # Круговой массив1: Вырез-Вытянуть4, Бобышка-Вытянуть1 ×2 about axis
    pattern_circular_1_axis = Axis((0, 9, 0), (0, -1, 0))
    add([cut_extrude_4.rotate(pattern_circular_1_axis, i * 360 / PATTERN_CIRCULAR_1_COUNT) for i in range(1, PATTERN_CIRCULAR_1_COUNT)], mode=Mode.SUBTRACT)
    add([extrude_1.rotate(pattern_circular_1_axis, i * 360 / PATTERN_CIRCULAR_1_COUNT) for i in range(1, PATTERN_CIRCULAR_1_COUNT)])

    # Круговой массив1 copy 1: a dome of height H over a round flat face of radius A is a cap of a sphere of radius (A * A + H * H) / (2 * H)
    pattern_circular_1_copy_1_r = (PATTERN_CIRCULAR_1_COPY_1_FACE_RADIUS * PATTERN_CIRCULAR_1_COPY_1_FACE_RADIUS + PATTERN_CIRCULAR_1_COPY_1_HEIGHT * PATTERN_CIRCULAR_1_COPY_1_HEIGHT) / (2 * PATTERN_CIRCULAR_1_COPY_1_HEIGHT)
    pattern_circular_1_copy_1_base = Plane((0, 14.75, -4.95), z_dir=(0, 0, -1))
    with Locations(pattern_circular_1_copy_1_base.offset(PATTERN_CIRCULAR_1_COPY_1_HEIGHT - pattern_circular_1_copy_1_r)):
        pattern_circular_1_copy_1_ball = Sphere(pattern_circular_1_copy_1_r, mode=Mode.PRIVATE)
    add(split(pattern_circular_1_copy_1_ball, bisect_by=pattern_circular_1_copy_1_base, keep=Keep.TOP, mode=Mode.PRIVATE))


solid = part.part
